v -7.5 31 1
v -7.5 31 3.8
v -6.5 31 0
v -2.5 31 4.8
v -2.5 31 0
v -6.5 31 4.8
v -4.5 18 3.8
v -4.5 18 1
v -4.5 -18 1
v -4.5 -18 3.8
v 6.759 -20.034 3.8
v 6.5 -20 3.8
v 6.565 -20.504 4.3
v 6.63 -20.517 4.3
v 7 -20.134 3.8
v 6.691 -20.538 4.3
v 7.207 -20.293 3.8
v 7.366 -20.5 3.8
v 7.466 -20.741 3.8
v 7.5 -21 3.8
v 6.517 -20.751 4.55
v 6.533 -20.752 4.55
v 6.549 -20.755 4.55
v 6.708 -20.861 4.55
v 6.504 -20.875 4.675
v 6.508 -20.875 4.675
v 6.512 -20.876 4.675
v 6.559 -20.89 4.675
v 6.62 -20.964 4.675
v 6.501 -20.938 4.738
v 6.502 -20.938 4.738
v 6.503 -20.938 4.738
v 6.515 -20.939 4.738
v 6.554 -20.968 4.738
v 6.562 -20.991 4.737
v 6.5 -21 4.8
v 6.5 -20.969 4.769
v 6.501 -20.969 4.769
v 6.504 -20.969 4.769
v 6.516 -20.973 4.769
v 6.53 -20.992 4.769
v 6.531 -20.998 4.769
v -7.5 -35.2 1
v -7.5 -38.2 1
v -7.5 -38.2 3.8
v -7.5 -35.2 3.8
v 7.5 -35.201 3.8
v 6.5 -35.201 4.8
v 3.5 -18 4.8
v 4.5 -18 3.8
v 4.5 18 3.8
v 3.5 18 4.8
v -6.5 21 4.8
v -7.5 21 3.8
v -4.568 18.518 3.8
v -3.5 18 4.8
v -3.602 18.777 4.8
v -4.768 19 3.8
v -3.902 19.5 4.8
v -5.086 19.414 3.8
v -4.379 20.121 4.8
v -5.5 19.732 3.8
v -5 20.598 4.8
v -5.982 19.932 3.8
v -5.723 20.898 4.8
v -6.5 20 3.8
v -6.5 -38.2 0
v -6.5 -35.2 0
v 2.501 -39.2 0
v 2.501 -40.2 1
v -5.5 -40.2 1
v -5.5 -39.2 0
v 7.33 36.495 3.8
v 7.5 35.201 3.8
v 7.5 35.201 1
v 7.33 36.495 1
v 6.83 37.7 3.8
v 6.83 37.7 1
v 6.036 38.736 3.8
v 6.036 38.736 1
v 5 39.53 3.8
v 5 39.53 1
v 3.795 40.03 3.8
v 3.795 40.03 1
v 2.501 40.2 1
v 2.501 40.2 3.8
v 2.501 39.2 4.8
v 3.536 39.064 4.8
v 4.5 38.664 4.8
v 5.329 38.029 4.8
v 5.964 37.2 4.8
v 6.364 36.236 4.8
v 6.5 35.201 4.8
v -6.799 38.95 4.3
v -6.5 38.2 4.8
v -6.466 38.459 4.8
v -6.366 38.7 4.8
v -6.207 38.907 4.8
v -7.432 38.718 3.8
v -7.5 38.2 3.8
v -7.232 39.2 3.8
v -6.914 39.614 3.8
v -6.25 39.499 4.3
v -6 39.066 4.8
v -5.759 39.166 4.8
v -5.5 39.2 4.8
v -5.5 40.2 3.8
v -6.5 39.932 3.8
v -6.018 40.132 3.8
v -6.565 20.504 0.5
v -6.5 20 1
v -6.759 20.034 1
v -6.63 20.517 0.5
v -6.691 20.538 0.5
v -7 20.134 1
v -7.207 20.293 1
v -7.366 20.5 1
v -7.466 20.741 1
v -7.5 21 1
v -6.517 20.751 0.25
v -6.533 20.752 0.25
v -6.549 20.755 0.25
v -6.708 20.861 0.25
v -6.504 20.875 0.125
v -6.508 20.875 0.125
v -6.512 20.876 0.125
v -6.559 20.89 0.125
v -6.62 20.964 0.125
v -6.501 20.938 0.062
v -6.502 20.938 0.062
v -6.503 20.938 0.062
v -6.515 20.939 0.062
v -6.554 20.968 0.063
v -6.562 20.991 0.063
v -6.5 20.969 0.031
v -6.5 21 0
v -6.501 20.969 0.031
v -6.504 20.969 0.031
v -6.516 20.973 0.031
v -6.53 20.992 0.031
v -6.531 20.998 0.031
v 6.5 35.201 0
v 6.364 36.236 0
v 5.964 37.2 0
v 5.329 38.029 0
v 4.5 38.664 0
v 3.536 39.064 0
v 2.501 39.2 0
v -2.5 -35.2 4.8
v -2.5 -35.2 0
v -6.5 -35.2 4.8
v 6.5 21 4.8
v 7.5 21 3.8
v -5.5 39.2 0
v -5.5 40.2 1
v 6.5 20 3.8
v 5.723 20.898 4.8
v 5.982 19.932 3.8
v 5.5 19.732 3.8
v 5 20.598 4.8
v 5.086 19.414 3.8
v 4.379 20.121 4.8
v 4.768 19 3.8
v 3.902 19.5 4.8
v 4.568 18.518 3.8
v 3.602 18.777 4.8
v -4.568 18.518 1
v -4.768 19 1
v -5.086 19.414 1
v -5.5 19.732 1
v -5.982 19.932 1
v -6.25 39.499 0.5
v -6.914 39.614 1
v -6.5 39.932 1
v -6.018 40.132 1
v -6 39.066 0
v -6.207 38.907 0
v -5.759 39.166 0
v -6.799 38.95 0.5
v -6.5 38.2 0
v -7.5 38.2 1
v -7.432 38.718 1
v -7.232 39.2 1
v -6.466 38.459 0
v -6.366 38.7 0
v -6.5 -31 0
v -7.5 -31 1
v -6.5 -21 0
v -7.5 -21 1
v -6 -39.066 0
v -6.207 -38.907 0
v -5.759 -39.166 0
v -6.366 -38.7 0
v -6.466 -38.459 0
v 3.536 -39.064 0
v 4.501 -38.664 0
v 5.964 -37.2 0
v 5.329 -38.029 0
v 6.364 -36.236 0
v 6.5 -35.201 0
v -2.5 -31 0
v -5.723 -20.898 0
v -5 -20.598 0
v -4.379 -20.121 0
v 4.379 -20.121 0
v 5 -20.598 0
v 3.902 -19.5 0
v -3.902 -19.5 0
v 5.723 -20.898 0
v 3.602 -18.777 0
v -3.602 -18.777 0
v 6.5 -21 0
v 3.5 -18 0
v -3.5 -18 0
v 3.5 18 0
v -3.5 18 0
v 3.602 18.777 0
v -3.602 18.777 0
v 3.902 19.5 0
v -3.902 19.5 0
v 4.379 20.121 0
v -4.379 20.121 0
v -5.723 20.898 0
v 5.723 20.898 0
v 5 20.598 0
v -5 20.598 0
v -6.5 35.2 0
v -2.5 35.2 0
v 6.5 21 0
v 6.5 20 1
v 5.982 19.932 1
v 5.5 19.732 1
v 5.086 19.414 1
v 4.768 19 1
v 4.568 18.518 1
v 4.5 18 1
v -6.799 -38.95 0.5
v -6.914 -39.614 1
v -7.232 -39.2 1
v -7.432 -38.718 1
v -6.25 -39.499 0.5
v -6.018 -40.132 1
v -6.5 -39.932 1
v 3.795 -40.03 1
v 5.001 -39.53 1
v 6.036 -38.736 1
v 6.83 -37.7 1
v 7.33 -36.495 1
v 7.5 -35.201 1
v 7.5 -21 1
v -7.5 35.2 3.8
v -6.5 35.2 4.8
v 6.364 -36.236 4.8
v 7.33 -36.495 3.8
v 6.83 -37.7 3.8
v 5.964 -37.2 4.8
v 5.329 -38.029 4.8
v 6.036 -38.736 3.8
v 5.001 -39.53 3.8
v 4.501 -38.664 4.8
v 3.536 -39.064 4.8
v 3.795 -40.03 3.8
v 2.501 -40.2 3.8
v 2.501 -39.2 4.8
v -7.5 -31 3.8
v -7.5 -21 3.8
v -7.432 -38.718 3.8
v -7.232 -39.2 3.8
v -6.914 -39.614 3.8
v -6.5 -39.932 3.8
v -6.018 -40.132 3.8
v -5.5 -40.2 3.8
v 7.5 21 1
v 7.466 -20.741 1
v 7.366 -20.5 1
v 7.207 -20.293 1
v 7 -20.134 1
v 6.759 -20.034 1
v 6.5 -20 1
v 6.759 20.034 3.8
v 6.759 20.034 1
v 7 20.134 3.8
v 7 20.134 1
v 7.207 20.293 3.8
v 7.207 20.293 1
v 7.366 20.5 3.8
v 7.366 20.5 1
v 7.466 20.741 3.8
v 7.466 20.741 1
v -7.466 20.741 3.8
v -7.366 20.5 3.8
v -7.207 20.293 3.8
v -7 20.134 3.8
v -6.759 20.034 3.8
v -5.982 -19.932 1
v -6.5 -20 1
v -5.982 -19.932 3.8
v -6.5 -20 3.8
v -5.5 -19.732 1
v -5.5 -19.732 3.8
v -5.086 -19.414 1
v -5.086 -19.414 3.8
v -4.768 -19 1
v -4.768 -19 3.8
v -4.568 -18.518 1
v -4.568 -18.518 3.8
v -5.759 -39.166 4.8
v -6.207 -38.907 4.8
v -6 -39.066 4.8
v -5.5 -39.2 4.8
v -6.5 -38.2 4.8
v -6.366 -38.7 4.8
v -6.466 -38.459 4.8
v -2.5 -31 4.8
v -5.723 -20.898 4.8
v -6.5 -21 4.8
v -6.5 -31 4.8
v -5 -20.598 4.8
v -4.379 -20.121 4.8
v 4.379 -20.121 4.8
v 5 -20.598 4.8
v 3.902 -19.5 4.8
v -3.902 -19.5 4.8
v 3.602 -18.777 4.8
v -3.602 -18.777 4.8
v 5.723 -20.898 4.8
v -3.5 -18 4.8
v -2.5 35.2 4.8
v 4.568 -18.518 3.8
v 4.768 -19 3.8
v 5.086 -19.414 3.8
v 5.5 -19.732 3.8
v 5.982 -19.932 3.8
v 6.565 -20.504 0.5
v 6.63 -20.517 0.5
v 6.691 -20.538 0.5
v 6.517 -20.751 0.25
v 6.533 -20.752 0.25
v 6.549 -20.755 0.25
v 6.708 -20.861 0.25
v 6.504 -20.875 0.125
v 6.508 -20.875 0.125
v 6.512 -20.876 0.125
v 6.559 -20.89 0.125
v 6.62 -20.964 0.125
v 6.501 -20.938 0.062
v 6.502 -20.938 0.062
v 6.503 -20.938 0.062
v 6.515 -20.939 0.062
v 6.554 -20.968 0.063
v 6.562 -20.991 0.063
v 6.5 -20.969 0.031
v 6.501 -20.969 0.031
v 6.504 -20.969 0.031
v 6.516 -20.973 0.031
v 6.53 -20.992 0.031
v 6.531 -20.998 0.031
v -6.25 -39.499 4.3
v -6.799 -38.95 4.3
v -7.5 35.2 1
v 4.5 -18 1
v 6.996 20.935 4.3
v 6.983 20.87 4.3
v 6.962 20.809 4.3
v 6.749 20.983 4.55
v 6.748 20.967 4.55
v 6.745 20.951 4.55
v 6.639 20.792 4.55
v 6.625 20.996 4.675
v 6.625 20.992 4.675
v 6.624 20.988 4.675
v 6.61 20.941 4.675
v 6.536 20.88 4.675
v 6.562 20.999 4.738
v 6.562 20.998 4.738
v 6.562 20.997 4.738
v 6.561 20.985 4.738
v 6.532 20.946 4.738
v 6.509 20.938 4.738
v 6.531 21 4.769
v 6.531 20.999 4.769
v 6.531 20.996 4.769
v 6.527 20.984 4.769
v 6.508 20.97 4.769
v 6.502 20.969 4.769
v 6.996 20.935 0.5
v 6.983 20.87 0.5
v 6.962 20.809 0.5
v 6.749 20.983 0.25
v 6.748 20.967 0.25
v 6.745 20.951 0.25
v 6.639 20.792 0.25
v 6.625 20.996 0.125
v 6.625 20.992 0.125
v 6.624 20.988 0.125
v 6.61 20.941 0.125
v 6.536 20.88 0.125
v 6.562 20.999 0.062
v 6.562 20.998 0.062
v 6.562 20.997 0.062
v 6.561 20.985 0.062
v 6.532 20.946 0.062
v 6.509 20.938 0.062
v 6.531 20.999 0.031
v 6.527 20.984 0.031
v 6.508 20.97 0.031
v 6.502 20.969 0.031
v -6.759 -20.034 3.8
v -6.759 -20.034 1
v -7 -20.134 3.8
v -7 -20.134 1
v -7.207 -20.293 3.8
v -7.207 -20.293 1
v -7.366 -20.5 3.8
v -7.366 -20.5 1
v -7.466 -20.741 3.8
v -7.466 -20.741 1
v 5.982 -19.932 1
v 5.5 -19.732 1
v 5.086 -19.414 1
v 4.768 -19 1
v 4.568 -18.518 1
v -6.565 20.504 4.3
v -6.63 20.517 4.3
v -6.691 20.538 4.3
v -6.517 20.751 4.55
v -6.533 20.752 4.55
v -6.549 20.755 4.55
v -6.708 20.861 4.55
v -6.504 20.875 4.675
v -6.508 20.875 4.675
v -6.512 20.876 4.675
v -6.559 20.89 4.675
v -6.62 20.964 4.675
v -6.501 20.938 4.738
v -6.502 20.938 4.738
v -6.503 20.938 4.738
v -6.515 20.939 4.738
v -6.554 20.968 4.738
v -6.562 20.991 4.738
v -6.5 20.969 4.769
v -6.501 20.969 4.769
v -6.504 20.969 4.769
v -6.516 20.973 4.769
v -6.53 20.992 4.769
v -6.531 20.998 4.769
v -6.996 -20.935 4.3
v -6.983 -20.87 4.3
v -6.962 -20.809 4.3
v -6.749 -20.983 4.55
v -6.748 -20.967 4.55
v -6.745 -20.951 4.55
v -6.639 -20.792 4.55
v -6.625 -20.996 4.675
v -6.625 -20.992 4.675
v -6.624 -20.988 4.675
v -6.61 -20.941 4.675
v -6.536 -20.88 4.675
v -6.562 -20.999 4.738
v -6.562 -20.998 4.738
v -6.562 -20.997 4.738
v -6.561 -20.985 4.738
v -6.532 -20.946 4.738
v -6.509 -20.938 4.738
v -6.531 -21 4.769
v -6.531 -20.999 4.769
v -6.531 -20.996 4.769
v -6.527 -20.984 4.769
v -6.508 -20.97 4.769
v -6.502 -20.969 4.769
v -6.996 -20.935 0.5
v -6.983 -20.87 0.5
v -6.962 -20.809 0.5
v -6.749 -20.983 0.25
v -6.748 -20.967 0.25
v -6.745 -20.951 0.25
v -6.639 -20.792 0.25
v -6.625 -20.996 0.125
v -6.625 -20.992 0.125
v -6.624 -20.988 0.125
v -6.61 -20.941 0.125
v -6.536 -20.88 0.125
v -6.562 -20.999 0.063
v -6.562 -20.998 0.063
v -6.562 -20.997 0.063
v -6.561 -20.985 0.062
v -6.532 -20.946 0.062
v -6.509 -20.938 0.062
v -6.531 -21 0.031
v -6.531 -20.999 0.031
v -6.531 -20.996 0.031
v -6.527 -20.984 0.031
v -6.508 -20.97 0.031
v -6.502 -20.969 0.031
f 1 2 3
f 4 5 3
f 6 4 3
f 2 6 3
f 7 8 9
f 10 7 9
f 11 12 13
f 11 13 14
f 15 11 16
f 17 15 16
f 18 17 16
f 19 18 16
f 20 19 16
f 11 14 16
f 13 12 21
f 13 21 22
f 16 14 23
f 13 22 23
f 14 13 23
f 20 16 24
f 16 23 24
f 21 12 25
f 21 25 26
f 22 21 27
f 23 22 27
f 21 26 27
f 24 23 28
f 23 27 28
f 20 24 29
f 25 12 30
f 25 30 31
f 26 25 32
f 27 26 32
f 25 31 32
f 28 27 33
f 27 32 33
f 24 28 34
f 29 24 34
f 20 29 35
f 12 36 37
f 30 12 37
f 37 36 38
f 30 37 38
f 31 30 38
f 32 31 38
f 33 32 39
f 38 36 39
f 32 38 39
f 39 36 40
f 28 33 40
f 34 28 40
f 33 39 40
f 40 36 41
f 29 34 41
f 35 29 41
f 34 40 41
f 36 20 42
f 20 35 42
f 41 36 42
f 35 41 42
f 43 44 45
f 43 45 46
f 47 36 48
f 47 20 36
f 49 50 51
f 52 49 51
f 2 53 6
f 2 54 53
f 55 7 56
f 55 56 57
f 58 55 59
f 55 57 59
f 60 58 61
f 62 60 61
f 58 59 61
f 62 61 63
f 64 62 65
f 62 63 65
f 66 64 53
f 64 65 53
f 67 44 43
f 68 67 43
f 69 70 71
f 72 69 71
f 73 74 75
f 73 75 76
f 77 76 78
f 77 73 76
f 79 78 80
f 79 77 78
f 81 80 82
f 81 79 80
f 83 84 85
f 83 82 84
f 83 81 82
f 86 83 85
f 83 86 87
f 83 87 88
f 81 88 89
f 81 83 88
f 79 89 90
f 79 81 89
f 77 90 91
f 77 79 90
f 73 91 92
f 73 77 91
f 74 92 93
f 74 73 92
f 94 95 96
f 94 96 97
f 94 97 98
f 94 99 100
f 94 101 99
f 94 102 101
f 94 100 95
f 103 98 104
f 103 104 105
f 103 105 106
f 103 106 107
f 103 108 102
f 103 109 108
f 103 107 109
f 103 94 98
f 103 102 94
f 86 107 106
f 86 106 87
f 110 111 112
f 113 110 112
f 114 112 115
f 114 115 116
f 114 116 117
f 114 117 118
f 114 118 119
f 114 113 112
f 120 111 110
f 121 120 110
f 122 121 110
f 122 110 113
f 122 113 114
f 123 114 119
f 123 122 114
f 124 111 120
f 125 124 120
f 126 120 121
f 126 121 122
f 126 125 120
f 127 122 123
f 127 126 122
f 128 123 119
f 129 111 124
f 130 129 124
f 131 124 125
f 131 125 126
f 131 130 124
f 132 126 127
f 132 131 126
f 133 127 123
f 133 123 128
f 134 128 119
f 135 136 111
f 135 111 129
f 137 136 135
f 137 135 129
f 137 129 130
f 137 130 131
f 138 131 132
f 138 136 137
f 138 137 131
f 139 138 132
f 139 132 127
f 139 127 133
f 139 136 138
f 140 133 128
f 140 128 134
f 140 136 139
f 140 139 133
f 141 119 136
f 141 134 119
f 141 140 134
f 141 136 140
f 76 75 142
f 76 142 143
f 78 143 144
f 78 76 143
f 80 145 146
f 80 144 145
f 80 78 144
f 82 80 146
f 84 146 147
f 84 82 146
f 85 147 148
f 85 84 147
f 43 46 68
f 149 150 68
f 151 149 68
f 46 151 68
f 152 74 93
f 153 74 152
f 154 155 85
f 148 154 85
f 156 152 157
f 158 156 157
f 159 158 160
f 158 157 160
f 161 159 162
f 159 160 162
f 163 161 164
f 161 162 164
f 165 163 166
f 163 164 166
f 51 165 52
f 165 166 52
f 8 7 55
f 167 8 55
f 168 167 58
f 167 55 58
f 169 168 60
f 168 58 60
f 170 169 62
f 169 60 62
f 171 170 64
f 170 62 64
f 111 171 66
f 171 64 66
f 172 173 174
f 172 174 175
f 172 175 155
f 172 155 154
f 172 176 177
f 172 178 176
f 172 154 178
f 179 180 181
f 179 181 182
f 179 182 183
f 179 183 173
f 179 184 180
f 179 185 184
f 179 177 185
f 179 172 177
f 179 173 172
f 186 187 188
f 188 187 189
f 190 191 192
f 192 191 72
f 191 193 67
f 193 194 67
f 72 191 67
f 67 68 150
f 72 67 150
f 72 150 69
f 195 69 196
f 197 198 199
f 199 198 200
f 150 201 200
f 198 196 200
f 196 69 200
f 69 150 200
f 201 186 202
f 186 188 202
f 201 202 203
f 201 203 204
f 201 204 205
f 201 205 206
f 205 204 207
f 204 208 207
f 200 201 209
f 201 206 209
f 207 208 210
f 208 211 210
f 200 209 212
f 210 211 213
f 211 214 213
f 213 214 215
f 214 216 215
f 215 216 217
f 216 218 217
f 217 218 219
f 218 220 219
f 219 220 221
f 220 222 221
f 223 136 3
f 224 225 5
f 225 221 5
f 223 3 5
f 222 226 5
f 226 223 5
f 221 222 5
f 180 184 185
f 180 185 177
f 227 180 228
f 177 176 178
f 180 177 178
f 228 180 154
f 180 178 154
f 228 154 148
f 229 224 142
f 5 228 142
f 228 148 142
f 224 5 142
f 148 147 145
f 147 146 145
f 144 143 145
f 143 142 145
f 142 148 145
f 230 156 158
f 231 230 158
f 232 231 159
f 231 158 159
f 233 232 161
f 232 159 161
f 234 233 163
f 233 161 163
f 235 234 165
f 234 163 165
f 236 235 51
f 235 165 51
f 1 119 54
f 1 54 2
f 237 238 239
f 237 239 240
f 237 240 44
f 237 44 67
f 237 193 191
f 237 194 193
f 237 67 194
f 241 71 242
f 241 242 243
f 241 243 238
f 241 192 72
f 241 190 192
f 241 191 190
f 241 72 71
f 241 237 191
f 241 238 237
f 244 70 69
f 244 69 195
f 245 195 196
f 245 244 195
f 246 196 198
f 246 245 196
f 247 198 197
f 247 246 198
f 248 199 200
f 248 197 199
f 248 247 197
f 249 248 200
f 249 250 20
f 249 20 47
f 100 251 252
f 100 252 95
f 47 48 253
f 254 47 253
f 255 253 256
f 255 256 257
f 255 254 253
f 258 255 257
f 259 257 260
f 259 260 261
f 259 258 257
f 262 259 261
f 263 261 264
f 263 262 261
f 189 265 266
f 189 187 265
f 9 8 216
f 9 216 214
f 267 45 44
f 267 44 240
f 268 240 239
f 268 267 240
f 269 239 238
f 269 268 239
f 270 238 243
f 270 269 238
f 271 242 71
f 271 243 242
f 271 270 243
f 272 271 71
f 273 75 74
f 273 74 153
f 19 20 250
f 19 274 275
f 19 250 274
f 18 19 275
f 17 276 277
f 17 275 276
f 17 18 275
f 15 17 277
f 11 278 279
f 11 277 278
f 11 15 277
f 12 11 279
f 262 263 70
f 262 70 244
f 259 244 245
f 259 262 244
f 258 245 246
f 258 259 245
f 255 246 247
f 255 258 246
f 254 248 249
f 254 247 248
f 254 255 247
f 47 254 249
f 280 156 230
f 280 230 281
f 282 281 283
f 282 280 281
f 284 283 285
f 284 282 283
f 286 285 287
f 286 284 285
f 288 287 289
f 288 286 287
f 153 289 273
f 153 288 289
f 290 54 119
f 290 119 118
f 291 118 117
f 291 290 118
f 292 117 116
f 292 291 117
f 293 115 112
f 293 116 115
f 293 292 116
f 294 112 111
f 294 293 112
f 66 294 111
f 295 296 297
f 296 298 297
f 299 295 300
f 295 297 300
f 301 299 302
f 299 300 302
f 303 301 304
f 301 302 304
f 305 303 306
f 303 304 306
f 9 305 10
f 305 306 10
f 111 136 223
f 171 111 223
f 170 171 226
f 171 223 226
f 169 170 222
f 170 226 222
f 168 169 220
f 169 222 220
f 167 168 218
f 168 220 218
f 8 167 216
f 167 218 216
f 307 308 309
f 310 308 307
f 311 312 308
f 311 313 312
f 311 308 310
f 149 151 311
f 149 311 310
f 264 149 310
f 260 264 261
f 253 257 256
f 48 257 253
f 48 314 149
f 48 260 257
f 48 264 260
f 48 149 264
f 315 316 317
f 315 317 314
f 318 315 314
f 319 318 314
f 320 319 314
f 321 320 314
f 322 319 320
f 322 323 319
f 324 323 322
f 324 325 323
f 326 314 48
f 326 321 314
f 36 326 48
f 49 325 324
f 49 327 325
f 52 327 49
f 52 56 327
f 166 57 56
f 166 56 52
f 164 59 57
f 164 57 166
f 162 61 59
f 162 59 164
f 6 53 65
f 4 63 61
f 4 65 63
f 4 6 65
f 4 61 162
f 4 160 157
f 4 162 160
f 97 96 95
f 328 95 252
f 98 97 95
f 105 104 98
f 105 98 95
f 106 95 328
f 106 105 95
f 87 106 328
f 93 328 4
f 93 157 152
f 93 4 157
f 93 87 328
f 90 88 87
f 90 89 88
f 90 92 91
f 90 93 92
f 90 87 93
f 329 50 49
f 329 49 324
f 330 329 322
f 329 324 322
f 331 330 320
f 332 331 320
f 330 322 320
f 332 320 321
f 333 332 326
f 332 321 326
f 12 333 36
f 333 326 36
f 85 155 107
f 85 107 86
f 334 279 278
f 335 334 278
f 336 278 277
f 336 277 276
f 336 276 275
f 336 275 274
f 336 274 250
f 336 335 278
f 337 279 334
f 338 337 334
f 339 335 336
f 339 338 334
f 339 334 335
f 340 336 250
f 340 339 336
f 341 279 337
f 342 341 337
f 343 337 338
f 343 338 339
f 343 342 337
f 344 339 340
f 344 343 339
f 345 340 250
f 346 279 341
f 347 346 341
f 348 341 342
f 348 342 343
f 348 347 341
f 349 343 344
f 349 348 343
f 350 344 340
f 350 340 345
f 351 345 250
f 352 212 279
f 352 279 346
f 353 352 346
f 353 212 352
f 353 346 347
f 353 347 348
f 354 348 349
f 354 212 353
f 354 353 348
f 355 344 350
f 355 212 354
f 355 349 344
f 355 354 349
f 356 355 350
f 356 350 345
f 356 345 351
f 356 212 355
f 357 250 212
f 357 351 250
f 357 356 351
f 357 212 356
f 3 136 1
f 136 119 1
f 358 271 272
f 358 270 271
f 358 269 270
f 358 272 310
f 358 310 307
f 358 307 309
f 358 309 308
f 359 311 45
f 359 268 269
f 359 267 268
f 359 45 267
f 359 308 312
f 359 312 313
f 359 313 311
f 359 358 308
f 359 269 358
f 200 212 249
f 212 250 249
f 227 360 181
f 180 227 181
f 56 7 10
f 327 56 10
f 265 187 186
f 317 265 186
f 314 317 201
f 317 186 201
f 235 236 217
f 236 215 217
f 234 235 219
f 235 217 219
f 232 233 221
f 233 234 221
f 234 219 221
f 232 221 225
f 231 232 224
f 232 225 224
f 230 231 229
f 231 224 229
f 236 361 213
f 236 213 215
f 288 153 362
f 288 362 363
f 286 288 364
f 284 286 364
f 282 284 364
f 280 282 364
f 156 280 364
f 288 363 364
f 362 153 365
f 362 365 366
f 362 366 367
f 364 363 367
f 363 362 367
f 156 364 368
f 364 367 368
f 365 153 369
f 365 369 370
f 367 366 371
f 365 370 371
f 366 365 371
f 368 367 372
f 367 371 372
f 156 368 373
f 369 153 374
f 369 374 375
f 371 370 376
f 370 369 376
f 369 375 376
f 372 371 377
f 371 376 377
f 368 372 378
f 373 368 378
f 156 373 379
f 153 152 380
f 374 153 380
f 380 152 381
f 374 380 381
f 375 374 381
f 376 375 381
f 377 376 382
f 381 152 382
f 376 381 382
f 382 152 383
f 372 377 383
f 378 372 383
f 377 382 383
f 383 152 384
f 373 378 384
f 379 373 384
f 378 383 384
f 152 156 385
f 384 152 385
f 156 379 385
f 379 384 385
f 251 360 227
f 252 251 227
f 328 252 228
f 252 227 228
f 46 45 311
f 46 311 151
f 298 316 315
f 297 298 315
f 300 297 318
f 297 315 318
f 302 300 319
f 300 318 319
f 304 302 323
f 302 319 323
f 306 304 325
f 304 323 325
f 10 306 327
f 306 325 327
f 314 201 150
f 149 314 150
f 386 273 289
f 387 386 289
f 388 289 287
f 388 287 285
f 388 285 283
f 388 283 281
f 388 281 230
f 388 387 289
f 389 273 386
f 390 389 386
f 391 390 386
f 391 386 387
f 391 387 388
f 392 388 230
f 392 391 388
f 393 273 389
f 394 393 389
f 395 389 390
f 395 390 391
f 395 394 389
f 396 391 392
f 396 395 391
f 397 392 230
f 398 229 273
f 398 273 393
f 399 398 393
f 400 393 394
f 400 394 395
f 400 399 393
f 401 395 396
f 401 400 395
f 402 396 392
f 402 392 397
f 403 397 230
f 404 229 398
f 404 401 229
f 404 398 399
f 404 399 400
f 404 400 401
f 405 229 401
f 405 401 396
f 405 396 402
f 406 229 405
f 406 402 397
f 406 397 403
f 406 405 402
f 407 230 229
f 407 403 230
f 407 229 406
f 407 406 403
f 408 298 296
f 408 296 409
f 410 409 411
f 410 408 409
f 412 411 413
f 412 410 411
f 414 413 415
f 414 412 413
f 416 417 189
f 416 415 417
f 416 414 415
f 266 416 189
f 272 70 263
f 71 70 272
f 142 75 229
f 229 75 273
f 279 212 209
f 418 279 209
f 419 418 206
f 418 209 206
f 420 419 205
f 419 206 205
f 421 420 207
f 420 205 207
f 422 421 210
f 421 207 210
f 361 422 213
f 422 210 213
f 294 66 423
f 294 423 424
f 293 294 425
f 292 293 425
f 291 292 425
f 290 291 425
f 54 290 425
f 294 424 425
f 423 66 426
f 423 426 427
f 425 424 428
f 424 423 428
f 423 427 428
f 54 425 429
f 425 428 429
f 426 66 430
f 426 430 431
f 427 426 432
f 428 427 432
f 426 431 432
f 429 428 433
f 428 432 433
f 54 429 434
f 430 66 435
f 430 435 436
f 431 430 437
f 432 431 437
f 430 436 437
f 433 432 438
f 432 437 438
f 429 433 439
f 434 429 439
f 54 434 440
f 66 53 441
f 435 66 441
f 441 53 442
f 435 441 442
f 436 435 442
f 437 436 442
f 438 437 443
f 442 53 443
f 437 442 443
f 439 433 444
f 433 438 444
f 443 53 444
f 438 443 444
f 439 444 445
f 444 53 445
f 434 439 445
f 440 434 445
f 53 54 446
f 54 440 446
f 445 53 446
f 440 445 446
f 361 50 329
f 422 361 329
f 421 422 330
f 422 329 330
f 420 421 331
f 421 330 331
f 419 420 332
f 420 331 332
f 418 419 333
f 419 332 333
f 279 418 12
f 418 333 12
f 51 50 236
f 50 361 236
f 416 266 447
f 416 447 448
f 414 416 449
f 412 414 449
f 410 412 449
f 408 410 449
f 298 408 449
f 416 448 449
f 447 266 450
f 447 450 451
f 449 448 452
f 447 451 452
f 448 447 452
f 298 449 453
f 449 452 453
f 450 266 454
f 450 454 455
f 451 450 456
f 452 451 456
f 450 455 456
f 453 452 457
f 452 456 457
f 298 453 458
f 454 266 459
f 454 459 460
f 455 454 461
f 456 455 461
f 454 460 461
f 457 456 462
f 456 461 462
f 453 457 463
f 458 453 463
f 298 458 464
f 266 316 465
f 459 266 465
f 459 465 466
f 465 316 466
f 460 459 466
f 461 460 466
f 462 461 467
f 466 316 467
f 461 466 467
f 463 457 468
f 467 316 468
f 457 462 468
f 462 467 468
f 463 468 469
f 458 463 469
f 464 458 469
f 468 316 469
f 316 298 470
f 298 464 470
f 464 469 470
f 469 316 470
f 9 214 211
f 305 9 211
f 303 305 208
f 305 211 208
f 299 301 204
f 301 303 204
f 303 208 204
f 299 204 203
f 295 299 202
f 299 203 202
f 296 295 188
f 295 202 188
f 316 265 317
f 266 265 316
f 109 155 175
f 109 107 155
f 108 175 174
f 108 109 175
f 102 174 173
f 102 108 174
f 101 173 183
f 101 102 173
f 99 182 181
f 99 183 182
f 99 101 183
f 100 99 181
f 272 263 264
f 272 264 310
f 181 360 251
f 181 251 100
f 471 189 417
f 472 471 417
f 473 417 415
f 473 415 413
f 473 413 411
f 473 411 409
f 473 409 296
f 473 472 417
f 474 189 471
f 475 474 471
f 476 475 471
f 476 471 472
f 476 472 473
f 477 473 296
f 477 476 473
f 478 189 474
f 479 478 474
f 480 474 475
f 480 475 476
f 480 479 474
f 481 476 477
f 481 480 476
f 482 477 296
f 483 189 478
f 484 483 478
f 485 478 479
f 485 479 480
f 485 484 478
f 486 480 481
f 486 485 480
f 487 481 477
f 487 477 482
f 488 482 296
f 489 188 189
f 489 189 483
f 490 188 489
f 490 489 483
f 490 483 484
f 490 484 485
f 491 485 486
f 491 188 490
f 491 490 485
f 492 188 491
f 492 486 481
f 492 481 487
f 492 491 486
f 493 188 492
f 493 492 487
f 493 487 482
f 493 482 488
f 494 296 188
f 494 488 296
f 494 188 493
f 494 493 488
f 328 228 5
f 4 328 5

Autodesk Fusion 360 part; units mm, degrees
sketch "Sketch1" plane through (0, 0, 0) normal (0, 0, 1) x (1, 0, 0)
  line L0 (7.5, -40.2) -> (-7.5, -40.2)
  line L1 (-7.5, -40.2) -> (-7.5, 40.2)
  line L2 (-7.5, 40.2) -> (7.5, 40.2)
  line L3 (7.5, 40.2) -> (7.5, -40.2)
  line L4 (7.5, -40.2) -> (-7.5, 40.2) construction
  line L5 (-7.5, -40.2) -> (7.5, 40.2) construction
  line L6 (-7.5, 35.2) -> (-2.5, 35.2)
  line L7 (-2.5, 35.2) -> (-2.5, 31)
  line L8 (-2.5, 31) -> (-7.5, 31)
  line L9 (-7.5, 31) -> (-7.5, 35.2)
  line L10 (-7.5, -31) -> (-2.5, -31)
  line L11 (-2.5, -31) -> (-2.5, -35.2)
  line L12 (-2.5, -35.2) -> (-7.5, -35.2)
  line L13 (-7.5, -35.2) -> (-7.5, -31)
  line L14 (0, 1.75) -> (0, 22.5)
  line L15 (-7.5, 20) -> (-4.5, 20)
  line L16 (-4.5, 20) -> (-4.5, -20)
  line L17 (-4.5, -20) -> (-7.5, -20)
  line L18 (-7.5, -20) -> (-7.5, 20)
  line L19 (7.5, -20) -> (4.5, -20)
  line L20 (4.5, -20) -> (4.5, 20)
  line L21 (4.5, 20) -> (7.5, 20)
  line L22 (7.5, 20) -> (7.5, -20)
  dimension "d1" = 80.4
  dimension "d2" = 15
  dimension "d3" = 5
  dimension "d4" = 4.2
  dimension "d5" = 5
  dimension "d6" = 4.2
  dimension "d7" = 5
  dimension "d8" = 5
  dimension "d26" = 15
  dimension "d27" = 40.2
  dimension "d28" = 3
  dimension "d29" = 40
  dimension "d30" = 20
  dimension "d31" = 40
  dimension "d32" = 3
  dimension "d33" = 20
extrude "Extrude1" add sketch "Sketch1" along normal blind 4.8 contours L0 L1 L2 L3 L6 L7 L8 L10 L11 L12 L15 L16 L17 L19 L20 L21
fillet "Fillet1" radius 5 2 edges at (7.5, 40.2, 2.4) (7.5, -40.2, 2.4)
fillet "Fillet1" radius 2 6 edges at (-7.5, 40.2, 2.4) (-7.5, -40.2, 2.4) (-4.5, 20, 2.4) (4.5, 20, 2.4) (4.5, -20, 2.4) (-4.5, -20, 2.4)
fillet "Fillet1" radius 1 4 edges at (-7.5, 20, 2.4) (7.5, 20, 2.4) (-7.5, -20, 2.4) (7.5, -20, 2.4)
chamfer "Chamfer1" distance 1 angle 45 44 edges at (7.5, 28.1, 4.8) (7.2071, 20.2929, 4.8) (5.0858, 19.4142, 4.8) (4.5, 0, 4.8) (5.0858, -19.4142, 4.8) (7.2071, -20.2929, 4.8) (7.5, -28.1, 4.8) (6.0355, -38.7355, 4.8) (-1.5, -40.2, 4.8) (-6.9142, -39.6142, 4.8) (-7.5, -36.7, 4.8) (-7.5, 36.7, 4.8) (-6.9142, 39.6142, 4.8) (-1.5, 40.2, 4.8) (6.0355, 38.7355, 4.8) (7.5, -28.1, 0) (7.2071, -20.2929, 0) (5.0858, -19.4142, 0) (4.5, 0, 0) (5.0858, 19.4142, 0) (7.2071, 20.2929, 0) (7.5, 28.1, 0) (6.0355, 38.7355, 0) (-1.5, 40.2, 0) (-6.9142, 39.6142, 0) (-7.5, 36.7, 0) (-7.5, -36.7, 0) (-6.9142, -39.6142, 0) (-1.5, -40.2, 0) (6.0355, -38.7355, 0) (-7.5, -26, 0) (-7.2071, -20.2929, 0) (-5.0858, -19.4142, 0) (-4.5, 0, 0) (-5.0858, 19.4142, 0) (-7.2071, 20.2929, 0) (-7.5, 26, 0) (-7.5, 26, 4.8) (-7.2071, 20.2929, 4.8) (-5.0858, 19.4142, 4.8) (-4.5, 0, 4.8) (-5.0858, -19.4142, 4.8) (-7.2071, -20.2929, 4.8) (-7.5, -26, 4.8)
equation "d27 = d1 / 2"
equation "d30 = d29 / 2"
equation "d33 = d31 / 2"
